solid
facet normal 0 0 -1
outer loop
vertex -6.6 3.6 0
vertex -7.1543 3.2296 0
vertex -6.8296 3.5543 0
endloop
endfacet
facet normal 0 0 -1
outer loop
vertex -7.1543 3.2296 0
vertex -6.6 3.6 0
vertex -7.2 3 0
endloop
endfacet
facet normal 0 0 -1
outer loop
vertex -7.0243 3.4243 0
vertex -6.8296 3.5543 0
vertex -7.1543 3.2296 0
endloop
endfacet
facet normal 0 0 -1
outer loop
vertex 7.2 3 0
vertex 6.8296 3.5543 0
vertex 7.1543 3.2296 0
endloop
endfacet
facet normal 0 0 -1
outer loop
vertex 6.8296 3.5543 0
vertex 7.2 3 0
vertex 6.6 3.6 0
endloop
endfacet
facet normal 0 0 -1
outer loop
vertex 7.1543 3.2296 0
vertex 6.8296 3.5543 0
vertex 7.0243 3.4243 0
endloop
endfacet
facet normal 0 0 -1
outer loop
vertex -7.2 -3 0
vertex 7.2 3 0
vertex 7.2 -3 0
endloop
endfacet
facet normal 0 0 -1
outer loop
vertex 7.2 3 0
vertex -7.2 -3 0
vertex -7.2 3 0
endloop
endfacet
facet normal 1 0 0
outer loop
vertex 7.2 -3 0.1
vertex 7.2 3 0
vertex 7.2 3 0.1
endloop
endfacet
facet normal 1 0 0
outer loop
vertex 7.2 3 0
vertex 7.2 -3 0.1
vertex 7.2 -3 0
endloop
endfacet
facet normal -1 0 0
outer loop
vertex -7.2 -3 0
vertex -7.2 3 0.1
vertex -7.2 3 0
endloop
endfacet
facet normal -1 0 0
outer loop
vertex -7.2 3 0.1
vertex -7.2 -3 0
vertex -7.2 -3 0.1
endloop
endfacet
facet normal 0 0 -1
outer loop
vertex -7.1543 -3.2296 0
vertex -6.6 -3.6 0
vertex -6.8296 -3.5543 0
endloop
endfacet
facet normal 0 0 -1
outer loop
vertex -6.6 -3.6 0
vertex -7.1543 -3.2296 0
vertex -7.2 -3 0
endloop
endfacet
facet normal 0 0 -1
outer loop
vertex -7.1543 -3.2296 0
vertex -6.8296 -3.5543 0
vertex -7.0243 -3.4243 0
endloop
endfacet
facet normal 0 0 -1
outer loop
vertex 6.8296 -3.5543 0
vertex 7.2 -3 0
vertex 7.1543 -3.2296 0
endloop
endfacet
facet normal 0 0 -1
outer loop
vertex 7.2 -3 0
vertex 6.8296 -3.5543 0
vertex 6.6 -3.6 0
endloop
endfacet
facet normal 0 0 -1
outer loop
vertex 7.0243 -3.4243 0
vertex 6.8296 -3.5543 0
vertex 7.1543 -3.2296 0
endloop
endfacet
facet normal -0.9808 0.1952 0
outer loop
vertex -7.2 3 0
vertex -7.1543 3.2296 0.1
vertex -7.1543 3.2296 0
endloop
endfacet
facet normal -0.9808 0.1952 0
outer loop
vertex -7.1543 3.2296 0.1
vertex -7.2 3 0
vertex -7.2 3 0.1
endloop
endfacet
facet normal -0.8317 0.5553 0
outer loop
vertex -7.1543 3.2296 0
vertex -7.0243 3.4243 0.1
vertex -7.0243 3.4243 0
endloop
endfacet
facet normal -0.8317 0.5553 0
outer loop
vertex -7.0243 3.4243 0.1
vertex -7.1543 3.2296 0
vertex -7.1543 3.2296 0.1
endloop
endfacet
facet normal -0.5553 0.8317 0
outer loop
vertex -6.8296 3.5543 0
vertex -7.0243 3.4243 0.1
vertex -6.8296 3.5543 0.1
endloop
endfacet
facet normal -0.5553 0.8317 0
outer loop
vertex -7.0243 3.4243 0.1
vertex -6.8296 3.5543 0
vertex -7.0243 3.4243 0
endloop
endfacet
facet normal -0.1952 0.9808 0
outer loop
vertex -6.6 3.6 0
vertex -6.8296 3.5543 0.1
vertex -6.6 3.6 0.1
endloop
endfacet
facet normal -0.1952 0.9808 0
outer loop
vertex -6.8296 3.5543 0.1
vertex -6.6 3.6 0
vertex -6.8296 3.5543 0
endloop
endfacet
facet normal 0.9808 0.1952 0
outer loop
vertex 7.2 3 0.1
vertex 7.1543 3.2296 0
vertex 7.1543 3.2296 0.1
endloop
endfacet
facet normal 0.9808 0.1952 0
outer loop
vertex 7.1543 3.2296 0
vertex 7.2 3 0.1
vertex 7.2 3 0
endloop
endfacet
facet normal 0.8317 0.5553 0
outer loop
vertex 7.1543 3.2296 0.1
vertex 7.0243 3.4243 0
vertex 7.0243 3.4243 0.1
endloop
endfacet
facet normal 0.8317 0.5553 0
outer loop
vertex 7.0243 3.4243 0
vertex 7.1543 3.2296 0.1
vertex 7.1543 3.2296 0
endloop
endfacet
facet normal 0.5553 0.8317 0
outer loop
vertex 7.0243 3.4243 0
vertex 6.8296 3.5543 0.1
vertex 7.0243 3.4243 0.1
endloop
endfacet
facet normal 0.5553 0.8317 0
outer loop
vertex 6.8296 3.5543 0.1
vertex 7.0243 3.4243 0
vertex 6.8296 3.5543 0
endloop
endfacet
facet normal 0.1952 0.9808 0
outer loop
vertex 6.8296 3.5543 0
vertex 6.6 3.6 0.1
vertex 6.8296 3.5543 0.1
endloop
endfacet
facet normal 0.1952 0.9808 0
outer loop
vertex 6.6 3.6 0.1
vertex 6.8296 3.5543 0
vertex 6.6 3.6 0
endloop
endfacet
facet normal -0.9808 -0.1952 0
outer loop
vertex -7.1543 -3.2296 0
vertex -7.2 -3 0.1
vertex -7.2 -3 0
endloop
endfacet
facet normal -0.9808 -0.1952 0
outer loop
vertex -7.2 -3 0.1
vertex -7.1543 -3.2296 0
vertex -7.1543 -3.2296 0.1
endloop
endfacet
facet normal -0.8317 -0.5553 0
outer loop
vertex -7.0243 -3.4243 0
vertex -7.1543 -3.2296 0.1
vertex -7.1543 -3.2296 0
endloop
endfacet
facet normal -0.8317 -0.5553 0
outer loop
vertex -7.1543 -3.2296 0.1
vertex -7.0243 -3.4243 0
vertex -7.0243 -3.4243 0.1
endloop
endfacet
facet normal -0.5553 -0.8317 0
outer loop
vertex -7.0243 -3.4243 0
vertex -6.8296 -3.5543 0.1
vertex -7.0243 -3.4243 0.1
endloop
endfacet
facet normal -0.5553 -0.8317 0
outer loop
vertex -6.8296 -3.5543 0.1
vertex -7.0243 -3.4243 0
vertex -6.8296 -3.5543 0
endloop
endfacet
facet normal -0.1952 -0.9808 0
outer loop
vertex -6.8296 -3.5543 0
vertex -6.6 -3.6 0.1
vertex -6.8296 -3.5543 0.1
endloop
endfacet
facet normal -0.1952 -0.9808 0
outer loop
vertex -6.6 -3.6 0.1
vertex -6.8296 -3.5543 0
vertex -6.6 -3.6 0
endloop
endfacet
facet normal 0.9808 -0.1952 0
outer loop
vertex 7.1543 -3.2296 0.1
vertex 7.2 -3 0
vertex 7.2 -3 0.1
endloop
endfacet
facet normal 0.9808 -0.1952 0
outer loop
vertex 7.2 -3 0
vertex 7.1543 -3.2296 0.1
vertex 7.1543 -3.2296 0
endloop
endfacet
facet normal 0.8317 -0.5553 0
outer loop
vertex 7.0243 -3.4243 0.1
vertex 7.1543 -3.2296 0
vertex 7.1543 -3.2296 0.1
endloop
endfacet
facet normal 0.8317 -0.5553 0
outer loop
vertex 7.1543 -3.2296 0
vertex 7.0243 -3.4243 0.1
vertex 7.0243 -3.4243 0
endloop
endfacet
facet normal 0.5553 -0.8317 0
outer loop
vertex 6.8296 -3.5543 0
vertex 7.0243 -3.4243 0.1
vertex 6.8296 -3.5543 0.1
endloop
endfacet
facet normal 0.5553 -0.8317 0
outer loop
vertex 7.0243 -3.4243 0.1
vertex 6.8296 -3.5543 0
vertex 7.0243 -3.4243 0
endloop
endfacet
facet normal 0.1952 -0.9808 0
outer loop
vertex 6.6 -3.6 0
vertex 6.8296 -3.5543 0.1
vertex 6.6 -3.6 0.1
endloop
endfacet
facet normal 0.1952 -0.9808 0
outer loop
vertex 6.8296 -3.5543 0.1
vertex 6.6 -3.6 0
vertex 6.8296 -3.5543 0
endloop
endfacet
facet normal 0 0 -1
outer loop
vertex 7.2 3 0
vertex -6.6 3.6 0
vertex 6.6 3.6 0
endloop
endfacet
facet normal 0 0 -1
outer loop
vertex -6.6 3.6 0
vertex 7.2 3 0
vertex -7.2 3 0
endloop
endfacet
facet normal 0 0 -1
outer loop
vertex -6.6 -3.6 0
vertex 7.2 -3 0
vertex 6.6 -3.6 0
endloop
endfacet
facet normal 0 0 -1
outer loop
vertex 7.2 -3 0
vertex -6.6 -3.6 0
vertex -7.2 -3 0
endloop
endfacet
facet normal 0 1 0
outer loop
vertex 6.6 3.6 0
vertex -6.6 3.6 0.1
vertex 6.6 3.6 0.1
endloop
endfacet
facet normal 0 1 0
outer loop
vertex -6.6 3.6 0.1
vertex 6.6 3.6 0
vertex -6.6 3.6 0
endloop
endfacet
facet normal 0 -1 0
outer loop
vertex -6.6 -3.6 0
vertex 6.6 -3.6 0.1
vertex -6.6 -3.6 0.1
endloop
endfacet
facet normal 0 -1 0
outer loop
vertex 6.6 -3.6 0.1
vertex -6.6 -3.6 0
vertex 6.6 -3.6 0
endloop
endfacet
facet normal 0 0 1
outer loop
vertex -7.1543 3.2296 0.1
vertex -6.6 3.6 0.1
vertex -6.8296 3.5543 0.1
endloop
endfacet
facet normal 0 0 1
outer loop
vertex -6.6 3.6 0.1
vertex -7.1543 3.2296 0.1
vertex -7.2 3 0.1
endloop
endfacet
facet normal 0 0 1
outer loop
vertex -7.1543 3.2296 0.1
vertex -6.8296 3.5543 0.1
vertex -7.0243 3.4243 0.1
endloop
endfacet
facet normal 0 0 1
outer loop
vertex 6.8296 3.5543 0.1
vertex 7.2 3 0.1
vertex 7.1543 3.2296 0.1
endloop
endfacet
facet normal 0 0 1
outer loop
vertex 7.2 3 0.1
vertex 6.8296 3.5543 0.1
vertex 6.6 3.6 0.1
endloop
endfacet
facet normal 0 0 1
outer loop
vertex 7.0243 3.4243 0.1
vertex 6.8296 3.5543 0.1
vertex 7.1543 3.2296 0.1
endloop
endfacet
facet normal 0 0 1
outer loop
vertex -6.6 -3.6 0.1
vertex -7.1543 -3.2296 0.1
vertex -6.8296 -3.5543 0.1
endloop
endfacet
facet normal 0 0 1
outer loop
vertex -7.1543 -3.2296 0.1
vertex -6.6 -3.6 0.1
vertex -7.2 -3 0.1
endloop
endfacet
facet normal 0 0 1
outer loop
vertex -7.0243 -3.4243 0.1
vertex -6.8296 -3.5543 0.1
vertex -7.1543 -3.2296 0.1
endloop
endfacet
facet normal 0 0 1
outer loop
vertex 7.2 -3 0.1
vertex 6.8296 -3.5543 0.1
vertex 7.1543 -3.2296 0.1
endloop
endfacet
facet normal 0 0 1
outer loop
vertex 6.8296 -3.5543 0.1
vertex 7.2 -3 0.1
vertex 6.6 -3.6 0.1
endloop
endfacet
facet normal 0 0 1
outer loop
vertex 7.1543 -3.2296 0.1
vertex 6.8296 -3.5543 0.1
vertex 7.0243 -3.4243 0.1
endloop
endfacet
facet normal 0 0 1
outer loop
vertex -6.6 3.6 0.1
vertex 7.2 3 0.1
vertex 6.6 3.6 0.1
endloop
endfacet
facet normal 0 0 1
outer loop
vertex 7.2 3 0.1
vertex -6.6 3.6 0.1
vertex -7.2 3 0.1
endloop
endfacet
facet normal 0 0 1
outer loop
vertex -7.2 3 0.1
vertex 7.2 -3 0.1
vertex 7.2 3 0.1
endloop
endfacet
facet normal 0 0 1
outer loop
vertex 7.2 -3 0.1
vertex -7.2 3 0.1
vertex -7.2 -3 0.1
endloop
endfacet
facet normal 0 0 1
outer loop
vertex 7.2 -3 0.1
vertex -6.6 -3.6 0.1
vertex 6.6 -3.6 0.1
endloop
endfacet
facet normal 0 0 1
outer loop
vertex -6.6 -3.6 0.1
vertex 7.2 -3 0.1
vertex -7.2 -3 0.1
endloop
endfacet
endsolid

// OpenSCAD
// file: ../p/box3u12.scad
use <../lib.scad>
function ldraw_lib__box3u12() = [
// 0 Box with 3 Parallel Faces without Any Edges
// 0 Name: box3u12.dat
// 0 Author: J.C. Tchang [tchang]
// 0 !LDRAW_ORG Primitive UPDATE 2014-02
// 0 !LICENSE Licensed under CC BY 4.0 : see CAreadme.txt
// 
// 0 BFC CERTIFY CCW
  [0,"BFC","CERTIFY"],
  [0,"BFC","CCW"],
// 
// 0 !HISTORY 2014-12-23 [PTadmin] Official Update 2014-02
// 
// 
// 4 16 -1 1 1 1 1 1 1 1 -1 -1 1 -1
  [4,16,-1,1,1,1,1,1,1,1,-1,-1,1,-1],
// 4 16 -1 1 1 -1 0 1 1 0 1 1 1 1
  [4,16,-1,1,1,-1,0,1,1,0,1,1,1,1],
// 4 16 1 1 -1 1 0 -1 -1 0 -1 -1 1 -1
  [4,16,1,1,-1,1,0,-1,-1,0,-1,-1,1,-1],
];
module ldraw_lib__box3u12(step=0, col=false, unit=2/5, alt=false, line=0.2, solid=!$preview)
    makepoly(ldraw_lib__box3u12(), step=step, col=col, unit=unit, alt=alt, line=line, solid=solid);
ldraw_lib__box3u12(line=0.2);
// file: ../p/1-4cyli.scad
use <../lib.scad>
function ldraw_lib__1_4cyli() = [
// 0 Cylinder 0.25
// 0 Name: 1-4cyli.dat
// 0 Author: James Jessiman
// 0 !LDRAW_ORG Primitive UPDATE 2012-01
// 0 !LICENSE Licensed under CC BY 4.0 : see CAreadme.txt
// 
// 0 BFC CERTIFY CCW
  [0,"BFC","CERTIFY"],
  [0,"BFC","CCW"],
// 
// 0 !HISTORY 2002-03-23 [sbliss] Added BFC statement.
// 0 !HISTORY 2002-04-25 [PTadmin] Official Update 2002-02
// 0 !HISTORY 2007-06-22 [PTadmin] Header formatted for Contributor Agreement
// 0 !HISTORY 2008-07-01 [PTadmin] Official Update 2008-01
// 0 !HISTORY 2012-02-16 [Philo] Changed to CCW
// 0 !HISTORY 2012-03-30 [PTadmin] Official Update 2012-01
// 
// 
// 4 16 1 1 0 0.9239 1 0.3827 0.9239 0 0.3827 1 0 0
  [4,16,1,1,0,0.9239,1,0.3827,0.9239,0,0.3827,1,0,0],
// 5 24 1 0 0 1 1 0 0.9239 0 0.3827 1 0 -1
  [5,24,1,0,0,1,1,0,0.9239,0,0.3827,1,0,-1],
// 4 16 0.9239 1 0.3827 0.7071 1 0.7071 0.7071 0 0.7071 0.9239 0 0.3827
  [4,16,0.9239,1,0.3827,0.7071,1,0.7071,0.7071,0,0.7071,0.9239,0,0.3827],
// 5 24 0.9239 0 0.3827 0.9239 1 0.3827 0.7071 0 0.7071 1 0 0
  [5,24,0.9239,0,0.3827,0.9239,1,0.3827,0.7071,0,0.7071,1,0,0],
// 4 16 0.7071 1 0.7071 0.3827 1 0.9239 0.3827 0 0.9239 0.7071 0 0.7071
  [4,16,0.7071,1,0.7071,0.3827,1,0.9239,0.3827,0,0.9239,0.7071,0,0.7071],
// 5 24 0.7071 0 0.7071 0.7071 1 0.7071 0.3827 0 0.9239 0.9239 0 0.3827
  [5,24,0.7071,0,0.7071,0.7071,1,0.7071,0.3827,0,0.9239,0.9239,0,0.3827],
// 4 16 0.3827 1 0.9239 0 1 1 0 0 1 0.3827 0 0.9239
  [4,16,0.3827,1,0.9239,0,1,1,0,0,1,0.3827,0,0.9239],
// 5 24 0.3827 0 0.9239 0.3827 1 0.9239 0 0 1 0.7071 0 0.7071
  [5,24,0.3827,0,0.9239,0.3827,1,0.9239,0,0,1,0.7071,0,0.7071],
// 5 24 0 0 1 0 1 1 0.3827 0 0.9239 -1 0 1
  [5,24,0,0,1,0,1,1,0.3827,0,0.9239,-1,0,1],
];
module ldraw_lib__1_4cyli(step=0, col=false, unit=2/5, alt=false, line=0.2, solid=!$preview)
    makepoly(ldraw_lib__1_4cyli(), step=step, col=col, unit=unit, alt=alt, line=line, solid=solid);
ldraw_lib__1_4cyli(line=0.2);
// file: s/stickerback009x018.scad
use <../../lib.scad>
use <../../p/1-4chrd.scad>
use <../../p/1-4cyli.scad>
use <../../p/box3u12.scad>
function ldraw_lib__s__stickerback009x018() = [
// 0 ~Sticker Back  0.9 x  1.8
// 0 Name: s\stickerback009x018.dat
// 0 Author: Massimo Maso [Sirio]
// 0 !LDRAW_ORG Subpart UPDATE 2026-05
// 0 !LICENSE Licensed under CC BY 4.0 : see CAreadme.txt
// 
// 0 BFC CERTIFY CCW
  [0,"BFC","CERTIFY"],
  [0,"BFC","CCW"],
// 
// 0 !HISTORY 2026-05-31 [OrionP] Official Update 2026-05
// 
// 0 // Primitives
// 1 16 -16.5 0 7.5 -1.5 0 0 0 -1 0 0 0 1.5 1-4chrd.dat
  [1,16,-16.5,0,7.5,-1.5,0,0,0,-1,0,0,0,1.5, ldraw_lib__1_4chrd()],
// 1 16 16.5 0 7.5 1.5 0 0 0 -1 0 0 0 1.5 1-4chrd.dat
  [1,16,16.5,0,7.5,1.5,0,0,0,-1,0,0,0,1.5, ldraw_lib__1_4chrd()],
// 1 16 0 -.25 0 0 0 18 0 .25 0 7.5 0 0 box3u12.dat
  [1,16,0,-.25,0,0,0,18,0,.25,0,7.5,0,0, ldraw_lib__box3u12()],
// 1 16 -16.5 0 -7.5 -1.5 0 0 0 -1 0 0 0 -1.5 1-4chrd.dat
  [1,16,-16.5,0,-7.5,-1.5,0,0,0,-1,0,0,0,-1.5, ldraw_lib__1_4chrd()],
// 1 16 16.5 0 -7.5 1.5 0 0 0 -1 0 0 0 -1.5 1-4chrd.dat
  [1,16,16.5,0,-7.5,1.5,0,0,0,-1,0,0,0,-1.5, ldraw_lib__1_4chrd()],
// 1 16 -16.5 -.25 7.5 -1.5 0 0 0 .25 0 0 0 1.5 1-4cyli.dat
  [1,16,-16.5,-.25,7.5,-1.5,0,0,0,.25,0,0,0,1.5, ldraw_lib__1_4cyli()],
// 1 16 16.5 -.25 7.5 1.5 0 0 0 .25 0 0 0 1.5 1-4cyli.dat
  [1,16,16.5,-.25,7.5,1.5,0,0,0,.25,0,0,0,1.5, ldraw_lib__1_4cyli()],
// 1 16 -16.5 -.25 -7.5 -1.5 0 0 0 .25 0 0 0 -1.5 1-4cyli.dat
  [1,16,-16.5,-.25,-7.5,-1.5,0,0,0,.25,0,0,0,-1.5, ldraw_lib__1_4cyli()],
// 1 16 16.5 -.25 -7.5 1.5 0 0 0 .25 0 0 0 -1.5 1-4cyli.dat
  [1,16,16.5,-.25,-7.5,1.5,0,0,0,.25,0,0,0,-1.5, ldraw_lib__1_4cyli()],
// 0 // Bottom face
// 4 16 -18 0 7.5 -16.5 0 9 16.5 0 9 18 0 7.5
  [4,16,-18,0,7.5,-16.5,0,9,16.5,0,9,18,0,7.5],
// 4 16 -18 0 -7.5 18 0 -7.5 16.5 0 -9 -16.5 0 -9
  [4,16,-18,0,-7.5,18,0,-7.5,16.5,0,-9,-16.5,0,-9],
// 0 // Lateral face
// 4 16 -16.5 0 9 -16.5 -.25 9 16.5 -.25 9 16.5 0 9
  [4,16,-16.5,0,9,-16.5,-.25,9,16.5,-.25,9,16.5,0,9],
// 4 16 16.5 0 -9 16.5 -.25 -9 -16.5 -.25 -9 -16.5 0 -9
  [4,16,16.5,0,-9,16.5,-.25,-9,-16.5,-.25,-9,-16.5,0,-9],
];
module ldraw_lib__s__stickerback009x018(step=0, col=false, unit=2/5, alt=false, line=0.2, solid=!$preview)
    makepoly(ldraw_lib__s__stickerback009x018(), step=step, col=col, unit=unit, alt=alt, line=line, solid=solid);
ldraw_lib__s__stickerback009x018(line=0.2);
// file: ../p/1-4chrd.scad
use <../lib.scad>
function ldraw_lib__1_4chrd() = [
// 0 Chord 0.25
// 0 Name: 1-4chrd.dat
// 0 Author: Max Martin Richter [MMR1988]
// 0 !LDRAW_ORG Primitive UPDATE 2023-05
// 0 !LICENSE Licensed under CC BY 4.0 : see CAreadme.txt
// 
// 0 BFC CERTIFY CCW
  [0,"BFC","CERTIFY"],
  [0,"BFC","CCW"],
// 
// 0 !HISTORY 2004-04-22 [PTadmin] Official Update 2004-02
// 0 !HISTORY 2007-10-09 [PTadmin] Header formatted for Contributor Agreement
// 0 !HISTORY 2008-07-01 [PTadmin] Official Update 2008-01
// 0 !HISTORY 2012-08-02 [MMR1988] Re-creation with PrimGen2 and Rectifier
// 0 !HISTORY 2012-08-09 [PTadmin] Official Update 2012-02
// 0 !HISTORY 2023-10-27 [OrionP] Change author to MMR1988 from hafhead
// 0 !HISTORY 2023-10-31 [OrionP] Official Update 2023-05
// 
// 4 16 0.9239 0 0.3827 0.3827 0 0.9239 0 0 1 1 0 0
  [4,16,0.9239,0,0.3827,0.3827,0,0.9239,0,0,1,1,0,0],
// 3 16 0.7071 0 0.7071 0.3827 0 0.9239 0.9239 0 0.3827
  [3,16,0.7071,0,0.7071,0.3827,0,0.9239,0.9239,0,0.3827],
];
module ldraw_lib__1_4chrd(step=0, col=false, unit=2/5, alt=false, line=0.2, solid=!$preview)
    makepoly(ldraw_lib__1_4chrd(), step=step, col=col, unit=unit, alt=alt, line=line, solid=solid);
ldraw_lib__1_4chrd(line=0.2);
// main file
use <../lib.scad>
use <../p/1-4chrd.scad>
use <s/stickerback009x018.scad>
function ldraw_lib__4629791b() = [
// 0 Sticker  0.9 x  1.8 with Chrome Silver Mirror
// 0 Name: 4629791b.dat
// 0 Author: Takeshi Takahashi [RainbowDolphin]
// 0 !LDRAW_ORG Part UPDATE 2026-09
// 0 !LICENSE Licensed under CC BY 4.0 : see CAreadme.txt
// 
// 0 BFC CERTIFY CCW
  [0,"BFC","CERTIFY"],
  [0,"BFC","CCW"],
// 
// 0 !CATEGORY Sticker
// 0 !KEYWORDS BrickLink 5770stk01, Brickowl 151910, Lighthouse, Rebrickable 96624
// 0 !KEYWORDS Set 5770
// 
// 0 !HISTORY 2022-05-07 [PTadmin] Official Update 2022-03
// 0 !HISTORY 2026-04-17 [Sirio] Introduced stickerback and adapted top face
// 0 !HISTORY 2026-09-30 [OrionP] Official Update 2026-09
// 
// 0 // Stickerback
// 1 16 0 0 0 1 0 0 0 1 0 0 0 1 s\stickerback009x018.dat
  [1,16,0,0,0,1,0,0,0,1,0,0,0,1, ldraw_lib__s__stickerback009x018()],
// 0 // Primitives
// 1 383 -16.5 -.25 7.5 -1.5 0 0 0 1 0 0 0 1.5 1-4chrd.dat
  [1,383,-16.5,-.25,7.5,-1.5,0,0,0,1,0,0,0,1.5, ldraw_lib__1_4chrd()],
// 1 383 16.5 -.25 7.5 1.5 0 0 0 1 0 0 0 1.5 1-4chrd.dat
  [1,383,16.5,-.25,7.5,1.5,0,0,0,1,0,0,0,1.5, ldraw_lib__1_4chrd()],
// 1 383 -16.5 -.25 -7.5 -1.5 0 0 0 1 0 0 0 -1.5 1-4chrd.dat
  [1,383,-16.5,-.25,-7.5,-1.5,0,0,0,1,0,0,0,-1.5, ldraw_lib__1_4chrd()],
// 1 383 16.5 -.25 -7.5 1.5 0 0 0 1 0 0 0 -1.5 1-4chrd.dat
  [1,383,16.5,-.25,-7.5,1.5,0,0,0,1,0,0,0,-1.5, ldraw_lib__1_4chrd()],
// 0 // Front face
// 4 383 -18 -.25 7.5 18 -.25 7.5 16.5 -.25 9 -16.5 -.25 9
  [4,383,-18,-.25,7.5,18,-.25,7.5,16.5,-.25,9,-16.5,-.25,9],
// 4 383 -18 -.25 7.5 -18 -.25 -7.5 18 -.25 -7.5 18 -.25 7.5
  [4,383,-18,-.25,7.5,-18,-.25,-7.5,18,-.25,-7.5,18,-.25,7.5],
// 4 383 -18 -.25 -7.5 -16.5 -.25 -9 16.5 -.25 -9 18 -.25 -7.5
  [4,383,-18,-.25,-7.5,-16.5,-.25,-9,16.5,-.25,-9,18,-.25,-7.5],
];
module ldraw_lib__4629791b(step=0, col=false, unit=2/5, alt=false, line=0.2, solid=!$preview)
    makepoly(ldraw_lib__4629791b(), step=step, col=col, unit=unit, alt=alt, line=line, solid=solid);
ldraw_lib__4629791b(line=0.2);
